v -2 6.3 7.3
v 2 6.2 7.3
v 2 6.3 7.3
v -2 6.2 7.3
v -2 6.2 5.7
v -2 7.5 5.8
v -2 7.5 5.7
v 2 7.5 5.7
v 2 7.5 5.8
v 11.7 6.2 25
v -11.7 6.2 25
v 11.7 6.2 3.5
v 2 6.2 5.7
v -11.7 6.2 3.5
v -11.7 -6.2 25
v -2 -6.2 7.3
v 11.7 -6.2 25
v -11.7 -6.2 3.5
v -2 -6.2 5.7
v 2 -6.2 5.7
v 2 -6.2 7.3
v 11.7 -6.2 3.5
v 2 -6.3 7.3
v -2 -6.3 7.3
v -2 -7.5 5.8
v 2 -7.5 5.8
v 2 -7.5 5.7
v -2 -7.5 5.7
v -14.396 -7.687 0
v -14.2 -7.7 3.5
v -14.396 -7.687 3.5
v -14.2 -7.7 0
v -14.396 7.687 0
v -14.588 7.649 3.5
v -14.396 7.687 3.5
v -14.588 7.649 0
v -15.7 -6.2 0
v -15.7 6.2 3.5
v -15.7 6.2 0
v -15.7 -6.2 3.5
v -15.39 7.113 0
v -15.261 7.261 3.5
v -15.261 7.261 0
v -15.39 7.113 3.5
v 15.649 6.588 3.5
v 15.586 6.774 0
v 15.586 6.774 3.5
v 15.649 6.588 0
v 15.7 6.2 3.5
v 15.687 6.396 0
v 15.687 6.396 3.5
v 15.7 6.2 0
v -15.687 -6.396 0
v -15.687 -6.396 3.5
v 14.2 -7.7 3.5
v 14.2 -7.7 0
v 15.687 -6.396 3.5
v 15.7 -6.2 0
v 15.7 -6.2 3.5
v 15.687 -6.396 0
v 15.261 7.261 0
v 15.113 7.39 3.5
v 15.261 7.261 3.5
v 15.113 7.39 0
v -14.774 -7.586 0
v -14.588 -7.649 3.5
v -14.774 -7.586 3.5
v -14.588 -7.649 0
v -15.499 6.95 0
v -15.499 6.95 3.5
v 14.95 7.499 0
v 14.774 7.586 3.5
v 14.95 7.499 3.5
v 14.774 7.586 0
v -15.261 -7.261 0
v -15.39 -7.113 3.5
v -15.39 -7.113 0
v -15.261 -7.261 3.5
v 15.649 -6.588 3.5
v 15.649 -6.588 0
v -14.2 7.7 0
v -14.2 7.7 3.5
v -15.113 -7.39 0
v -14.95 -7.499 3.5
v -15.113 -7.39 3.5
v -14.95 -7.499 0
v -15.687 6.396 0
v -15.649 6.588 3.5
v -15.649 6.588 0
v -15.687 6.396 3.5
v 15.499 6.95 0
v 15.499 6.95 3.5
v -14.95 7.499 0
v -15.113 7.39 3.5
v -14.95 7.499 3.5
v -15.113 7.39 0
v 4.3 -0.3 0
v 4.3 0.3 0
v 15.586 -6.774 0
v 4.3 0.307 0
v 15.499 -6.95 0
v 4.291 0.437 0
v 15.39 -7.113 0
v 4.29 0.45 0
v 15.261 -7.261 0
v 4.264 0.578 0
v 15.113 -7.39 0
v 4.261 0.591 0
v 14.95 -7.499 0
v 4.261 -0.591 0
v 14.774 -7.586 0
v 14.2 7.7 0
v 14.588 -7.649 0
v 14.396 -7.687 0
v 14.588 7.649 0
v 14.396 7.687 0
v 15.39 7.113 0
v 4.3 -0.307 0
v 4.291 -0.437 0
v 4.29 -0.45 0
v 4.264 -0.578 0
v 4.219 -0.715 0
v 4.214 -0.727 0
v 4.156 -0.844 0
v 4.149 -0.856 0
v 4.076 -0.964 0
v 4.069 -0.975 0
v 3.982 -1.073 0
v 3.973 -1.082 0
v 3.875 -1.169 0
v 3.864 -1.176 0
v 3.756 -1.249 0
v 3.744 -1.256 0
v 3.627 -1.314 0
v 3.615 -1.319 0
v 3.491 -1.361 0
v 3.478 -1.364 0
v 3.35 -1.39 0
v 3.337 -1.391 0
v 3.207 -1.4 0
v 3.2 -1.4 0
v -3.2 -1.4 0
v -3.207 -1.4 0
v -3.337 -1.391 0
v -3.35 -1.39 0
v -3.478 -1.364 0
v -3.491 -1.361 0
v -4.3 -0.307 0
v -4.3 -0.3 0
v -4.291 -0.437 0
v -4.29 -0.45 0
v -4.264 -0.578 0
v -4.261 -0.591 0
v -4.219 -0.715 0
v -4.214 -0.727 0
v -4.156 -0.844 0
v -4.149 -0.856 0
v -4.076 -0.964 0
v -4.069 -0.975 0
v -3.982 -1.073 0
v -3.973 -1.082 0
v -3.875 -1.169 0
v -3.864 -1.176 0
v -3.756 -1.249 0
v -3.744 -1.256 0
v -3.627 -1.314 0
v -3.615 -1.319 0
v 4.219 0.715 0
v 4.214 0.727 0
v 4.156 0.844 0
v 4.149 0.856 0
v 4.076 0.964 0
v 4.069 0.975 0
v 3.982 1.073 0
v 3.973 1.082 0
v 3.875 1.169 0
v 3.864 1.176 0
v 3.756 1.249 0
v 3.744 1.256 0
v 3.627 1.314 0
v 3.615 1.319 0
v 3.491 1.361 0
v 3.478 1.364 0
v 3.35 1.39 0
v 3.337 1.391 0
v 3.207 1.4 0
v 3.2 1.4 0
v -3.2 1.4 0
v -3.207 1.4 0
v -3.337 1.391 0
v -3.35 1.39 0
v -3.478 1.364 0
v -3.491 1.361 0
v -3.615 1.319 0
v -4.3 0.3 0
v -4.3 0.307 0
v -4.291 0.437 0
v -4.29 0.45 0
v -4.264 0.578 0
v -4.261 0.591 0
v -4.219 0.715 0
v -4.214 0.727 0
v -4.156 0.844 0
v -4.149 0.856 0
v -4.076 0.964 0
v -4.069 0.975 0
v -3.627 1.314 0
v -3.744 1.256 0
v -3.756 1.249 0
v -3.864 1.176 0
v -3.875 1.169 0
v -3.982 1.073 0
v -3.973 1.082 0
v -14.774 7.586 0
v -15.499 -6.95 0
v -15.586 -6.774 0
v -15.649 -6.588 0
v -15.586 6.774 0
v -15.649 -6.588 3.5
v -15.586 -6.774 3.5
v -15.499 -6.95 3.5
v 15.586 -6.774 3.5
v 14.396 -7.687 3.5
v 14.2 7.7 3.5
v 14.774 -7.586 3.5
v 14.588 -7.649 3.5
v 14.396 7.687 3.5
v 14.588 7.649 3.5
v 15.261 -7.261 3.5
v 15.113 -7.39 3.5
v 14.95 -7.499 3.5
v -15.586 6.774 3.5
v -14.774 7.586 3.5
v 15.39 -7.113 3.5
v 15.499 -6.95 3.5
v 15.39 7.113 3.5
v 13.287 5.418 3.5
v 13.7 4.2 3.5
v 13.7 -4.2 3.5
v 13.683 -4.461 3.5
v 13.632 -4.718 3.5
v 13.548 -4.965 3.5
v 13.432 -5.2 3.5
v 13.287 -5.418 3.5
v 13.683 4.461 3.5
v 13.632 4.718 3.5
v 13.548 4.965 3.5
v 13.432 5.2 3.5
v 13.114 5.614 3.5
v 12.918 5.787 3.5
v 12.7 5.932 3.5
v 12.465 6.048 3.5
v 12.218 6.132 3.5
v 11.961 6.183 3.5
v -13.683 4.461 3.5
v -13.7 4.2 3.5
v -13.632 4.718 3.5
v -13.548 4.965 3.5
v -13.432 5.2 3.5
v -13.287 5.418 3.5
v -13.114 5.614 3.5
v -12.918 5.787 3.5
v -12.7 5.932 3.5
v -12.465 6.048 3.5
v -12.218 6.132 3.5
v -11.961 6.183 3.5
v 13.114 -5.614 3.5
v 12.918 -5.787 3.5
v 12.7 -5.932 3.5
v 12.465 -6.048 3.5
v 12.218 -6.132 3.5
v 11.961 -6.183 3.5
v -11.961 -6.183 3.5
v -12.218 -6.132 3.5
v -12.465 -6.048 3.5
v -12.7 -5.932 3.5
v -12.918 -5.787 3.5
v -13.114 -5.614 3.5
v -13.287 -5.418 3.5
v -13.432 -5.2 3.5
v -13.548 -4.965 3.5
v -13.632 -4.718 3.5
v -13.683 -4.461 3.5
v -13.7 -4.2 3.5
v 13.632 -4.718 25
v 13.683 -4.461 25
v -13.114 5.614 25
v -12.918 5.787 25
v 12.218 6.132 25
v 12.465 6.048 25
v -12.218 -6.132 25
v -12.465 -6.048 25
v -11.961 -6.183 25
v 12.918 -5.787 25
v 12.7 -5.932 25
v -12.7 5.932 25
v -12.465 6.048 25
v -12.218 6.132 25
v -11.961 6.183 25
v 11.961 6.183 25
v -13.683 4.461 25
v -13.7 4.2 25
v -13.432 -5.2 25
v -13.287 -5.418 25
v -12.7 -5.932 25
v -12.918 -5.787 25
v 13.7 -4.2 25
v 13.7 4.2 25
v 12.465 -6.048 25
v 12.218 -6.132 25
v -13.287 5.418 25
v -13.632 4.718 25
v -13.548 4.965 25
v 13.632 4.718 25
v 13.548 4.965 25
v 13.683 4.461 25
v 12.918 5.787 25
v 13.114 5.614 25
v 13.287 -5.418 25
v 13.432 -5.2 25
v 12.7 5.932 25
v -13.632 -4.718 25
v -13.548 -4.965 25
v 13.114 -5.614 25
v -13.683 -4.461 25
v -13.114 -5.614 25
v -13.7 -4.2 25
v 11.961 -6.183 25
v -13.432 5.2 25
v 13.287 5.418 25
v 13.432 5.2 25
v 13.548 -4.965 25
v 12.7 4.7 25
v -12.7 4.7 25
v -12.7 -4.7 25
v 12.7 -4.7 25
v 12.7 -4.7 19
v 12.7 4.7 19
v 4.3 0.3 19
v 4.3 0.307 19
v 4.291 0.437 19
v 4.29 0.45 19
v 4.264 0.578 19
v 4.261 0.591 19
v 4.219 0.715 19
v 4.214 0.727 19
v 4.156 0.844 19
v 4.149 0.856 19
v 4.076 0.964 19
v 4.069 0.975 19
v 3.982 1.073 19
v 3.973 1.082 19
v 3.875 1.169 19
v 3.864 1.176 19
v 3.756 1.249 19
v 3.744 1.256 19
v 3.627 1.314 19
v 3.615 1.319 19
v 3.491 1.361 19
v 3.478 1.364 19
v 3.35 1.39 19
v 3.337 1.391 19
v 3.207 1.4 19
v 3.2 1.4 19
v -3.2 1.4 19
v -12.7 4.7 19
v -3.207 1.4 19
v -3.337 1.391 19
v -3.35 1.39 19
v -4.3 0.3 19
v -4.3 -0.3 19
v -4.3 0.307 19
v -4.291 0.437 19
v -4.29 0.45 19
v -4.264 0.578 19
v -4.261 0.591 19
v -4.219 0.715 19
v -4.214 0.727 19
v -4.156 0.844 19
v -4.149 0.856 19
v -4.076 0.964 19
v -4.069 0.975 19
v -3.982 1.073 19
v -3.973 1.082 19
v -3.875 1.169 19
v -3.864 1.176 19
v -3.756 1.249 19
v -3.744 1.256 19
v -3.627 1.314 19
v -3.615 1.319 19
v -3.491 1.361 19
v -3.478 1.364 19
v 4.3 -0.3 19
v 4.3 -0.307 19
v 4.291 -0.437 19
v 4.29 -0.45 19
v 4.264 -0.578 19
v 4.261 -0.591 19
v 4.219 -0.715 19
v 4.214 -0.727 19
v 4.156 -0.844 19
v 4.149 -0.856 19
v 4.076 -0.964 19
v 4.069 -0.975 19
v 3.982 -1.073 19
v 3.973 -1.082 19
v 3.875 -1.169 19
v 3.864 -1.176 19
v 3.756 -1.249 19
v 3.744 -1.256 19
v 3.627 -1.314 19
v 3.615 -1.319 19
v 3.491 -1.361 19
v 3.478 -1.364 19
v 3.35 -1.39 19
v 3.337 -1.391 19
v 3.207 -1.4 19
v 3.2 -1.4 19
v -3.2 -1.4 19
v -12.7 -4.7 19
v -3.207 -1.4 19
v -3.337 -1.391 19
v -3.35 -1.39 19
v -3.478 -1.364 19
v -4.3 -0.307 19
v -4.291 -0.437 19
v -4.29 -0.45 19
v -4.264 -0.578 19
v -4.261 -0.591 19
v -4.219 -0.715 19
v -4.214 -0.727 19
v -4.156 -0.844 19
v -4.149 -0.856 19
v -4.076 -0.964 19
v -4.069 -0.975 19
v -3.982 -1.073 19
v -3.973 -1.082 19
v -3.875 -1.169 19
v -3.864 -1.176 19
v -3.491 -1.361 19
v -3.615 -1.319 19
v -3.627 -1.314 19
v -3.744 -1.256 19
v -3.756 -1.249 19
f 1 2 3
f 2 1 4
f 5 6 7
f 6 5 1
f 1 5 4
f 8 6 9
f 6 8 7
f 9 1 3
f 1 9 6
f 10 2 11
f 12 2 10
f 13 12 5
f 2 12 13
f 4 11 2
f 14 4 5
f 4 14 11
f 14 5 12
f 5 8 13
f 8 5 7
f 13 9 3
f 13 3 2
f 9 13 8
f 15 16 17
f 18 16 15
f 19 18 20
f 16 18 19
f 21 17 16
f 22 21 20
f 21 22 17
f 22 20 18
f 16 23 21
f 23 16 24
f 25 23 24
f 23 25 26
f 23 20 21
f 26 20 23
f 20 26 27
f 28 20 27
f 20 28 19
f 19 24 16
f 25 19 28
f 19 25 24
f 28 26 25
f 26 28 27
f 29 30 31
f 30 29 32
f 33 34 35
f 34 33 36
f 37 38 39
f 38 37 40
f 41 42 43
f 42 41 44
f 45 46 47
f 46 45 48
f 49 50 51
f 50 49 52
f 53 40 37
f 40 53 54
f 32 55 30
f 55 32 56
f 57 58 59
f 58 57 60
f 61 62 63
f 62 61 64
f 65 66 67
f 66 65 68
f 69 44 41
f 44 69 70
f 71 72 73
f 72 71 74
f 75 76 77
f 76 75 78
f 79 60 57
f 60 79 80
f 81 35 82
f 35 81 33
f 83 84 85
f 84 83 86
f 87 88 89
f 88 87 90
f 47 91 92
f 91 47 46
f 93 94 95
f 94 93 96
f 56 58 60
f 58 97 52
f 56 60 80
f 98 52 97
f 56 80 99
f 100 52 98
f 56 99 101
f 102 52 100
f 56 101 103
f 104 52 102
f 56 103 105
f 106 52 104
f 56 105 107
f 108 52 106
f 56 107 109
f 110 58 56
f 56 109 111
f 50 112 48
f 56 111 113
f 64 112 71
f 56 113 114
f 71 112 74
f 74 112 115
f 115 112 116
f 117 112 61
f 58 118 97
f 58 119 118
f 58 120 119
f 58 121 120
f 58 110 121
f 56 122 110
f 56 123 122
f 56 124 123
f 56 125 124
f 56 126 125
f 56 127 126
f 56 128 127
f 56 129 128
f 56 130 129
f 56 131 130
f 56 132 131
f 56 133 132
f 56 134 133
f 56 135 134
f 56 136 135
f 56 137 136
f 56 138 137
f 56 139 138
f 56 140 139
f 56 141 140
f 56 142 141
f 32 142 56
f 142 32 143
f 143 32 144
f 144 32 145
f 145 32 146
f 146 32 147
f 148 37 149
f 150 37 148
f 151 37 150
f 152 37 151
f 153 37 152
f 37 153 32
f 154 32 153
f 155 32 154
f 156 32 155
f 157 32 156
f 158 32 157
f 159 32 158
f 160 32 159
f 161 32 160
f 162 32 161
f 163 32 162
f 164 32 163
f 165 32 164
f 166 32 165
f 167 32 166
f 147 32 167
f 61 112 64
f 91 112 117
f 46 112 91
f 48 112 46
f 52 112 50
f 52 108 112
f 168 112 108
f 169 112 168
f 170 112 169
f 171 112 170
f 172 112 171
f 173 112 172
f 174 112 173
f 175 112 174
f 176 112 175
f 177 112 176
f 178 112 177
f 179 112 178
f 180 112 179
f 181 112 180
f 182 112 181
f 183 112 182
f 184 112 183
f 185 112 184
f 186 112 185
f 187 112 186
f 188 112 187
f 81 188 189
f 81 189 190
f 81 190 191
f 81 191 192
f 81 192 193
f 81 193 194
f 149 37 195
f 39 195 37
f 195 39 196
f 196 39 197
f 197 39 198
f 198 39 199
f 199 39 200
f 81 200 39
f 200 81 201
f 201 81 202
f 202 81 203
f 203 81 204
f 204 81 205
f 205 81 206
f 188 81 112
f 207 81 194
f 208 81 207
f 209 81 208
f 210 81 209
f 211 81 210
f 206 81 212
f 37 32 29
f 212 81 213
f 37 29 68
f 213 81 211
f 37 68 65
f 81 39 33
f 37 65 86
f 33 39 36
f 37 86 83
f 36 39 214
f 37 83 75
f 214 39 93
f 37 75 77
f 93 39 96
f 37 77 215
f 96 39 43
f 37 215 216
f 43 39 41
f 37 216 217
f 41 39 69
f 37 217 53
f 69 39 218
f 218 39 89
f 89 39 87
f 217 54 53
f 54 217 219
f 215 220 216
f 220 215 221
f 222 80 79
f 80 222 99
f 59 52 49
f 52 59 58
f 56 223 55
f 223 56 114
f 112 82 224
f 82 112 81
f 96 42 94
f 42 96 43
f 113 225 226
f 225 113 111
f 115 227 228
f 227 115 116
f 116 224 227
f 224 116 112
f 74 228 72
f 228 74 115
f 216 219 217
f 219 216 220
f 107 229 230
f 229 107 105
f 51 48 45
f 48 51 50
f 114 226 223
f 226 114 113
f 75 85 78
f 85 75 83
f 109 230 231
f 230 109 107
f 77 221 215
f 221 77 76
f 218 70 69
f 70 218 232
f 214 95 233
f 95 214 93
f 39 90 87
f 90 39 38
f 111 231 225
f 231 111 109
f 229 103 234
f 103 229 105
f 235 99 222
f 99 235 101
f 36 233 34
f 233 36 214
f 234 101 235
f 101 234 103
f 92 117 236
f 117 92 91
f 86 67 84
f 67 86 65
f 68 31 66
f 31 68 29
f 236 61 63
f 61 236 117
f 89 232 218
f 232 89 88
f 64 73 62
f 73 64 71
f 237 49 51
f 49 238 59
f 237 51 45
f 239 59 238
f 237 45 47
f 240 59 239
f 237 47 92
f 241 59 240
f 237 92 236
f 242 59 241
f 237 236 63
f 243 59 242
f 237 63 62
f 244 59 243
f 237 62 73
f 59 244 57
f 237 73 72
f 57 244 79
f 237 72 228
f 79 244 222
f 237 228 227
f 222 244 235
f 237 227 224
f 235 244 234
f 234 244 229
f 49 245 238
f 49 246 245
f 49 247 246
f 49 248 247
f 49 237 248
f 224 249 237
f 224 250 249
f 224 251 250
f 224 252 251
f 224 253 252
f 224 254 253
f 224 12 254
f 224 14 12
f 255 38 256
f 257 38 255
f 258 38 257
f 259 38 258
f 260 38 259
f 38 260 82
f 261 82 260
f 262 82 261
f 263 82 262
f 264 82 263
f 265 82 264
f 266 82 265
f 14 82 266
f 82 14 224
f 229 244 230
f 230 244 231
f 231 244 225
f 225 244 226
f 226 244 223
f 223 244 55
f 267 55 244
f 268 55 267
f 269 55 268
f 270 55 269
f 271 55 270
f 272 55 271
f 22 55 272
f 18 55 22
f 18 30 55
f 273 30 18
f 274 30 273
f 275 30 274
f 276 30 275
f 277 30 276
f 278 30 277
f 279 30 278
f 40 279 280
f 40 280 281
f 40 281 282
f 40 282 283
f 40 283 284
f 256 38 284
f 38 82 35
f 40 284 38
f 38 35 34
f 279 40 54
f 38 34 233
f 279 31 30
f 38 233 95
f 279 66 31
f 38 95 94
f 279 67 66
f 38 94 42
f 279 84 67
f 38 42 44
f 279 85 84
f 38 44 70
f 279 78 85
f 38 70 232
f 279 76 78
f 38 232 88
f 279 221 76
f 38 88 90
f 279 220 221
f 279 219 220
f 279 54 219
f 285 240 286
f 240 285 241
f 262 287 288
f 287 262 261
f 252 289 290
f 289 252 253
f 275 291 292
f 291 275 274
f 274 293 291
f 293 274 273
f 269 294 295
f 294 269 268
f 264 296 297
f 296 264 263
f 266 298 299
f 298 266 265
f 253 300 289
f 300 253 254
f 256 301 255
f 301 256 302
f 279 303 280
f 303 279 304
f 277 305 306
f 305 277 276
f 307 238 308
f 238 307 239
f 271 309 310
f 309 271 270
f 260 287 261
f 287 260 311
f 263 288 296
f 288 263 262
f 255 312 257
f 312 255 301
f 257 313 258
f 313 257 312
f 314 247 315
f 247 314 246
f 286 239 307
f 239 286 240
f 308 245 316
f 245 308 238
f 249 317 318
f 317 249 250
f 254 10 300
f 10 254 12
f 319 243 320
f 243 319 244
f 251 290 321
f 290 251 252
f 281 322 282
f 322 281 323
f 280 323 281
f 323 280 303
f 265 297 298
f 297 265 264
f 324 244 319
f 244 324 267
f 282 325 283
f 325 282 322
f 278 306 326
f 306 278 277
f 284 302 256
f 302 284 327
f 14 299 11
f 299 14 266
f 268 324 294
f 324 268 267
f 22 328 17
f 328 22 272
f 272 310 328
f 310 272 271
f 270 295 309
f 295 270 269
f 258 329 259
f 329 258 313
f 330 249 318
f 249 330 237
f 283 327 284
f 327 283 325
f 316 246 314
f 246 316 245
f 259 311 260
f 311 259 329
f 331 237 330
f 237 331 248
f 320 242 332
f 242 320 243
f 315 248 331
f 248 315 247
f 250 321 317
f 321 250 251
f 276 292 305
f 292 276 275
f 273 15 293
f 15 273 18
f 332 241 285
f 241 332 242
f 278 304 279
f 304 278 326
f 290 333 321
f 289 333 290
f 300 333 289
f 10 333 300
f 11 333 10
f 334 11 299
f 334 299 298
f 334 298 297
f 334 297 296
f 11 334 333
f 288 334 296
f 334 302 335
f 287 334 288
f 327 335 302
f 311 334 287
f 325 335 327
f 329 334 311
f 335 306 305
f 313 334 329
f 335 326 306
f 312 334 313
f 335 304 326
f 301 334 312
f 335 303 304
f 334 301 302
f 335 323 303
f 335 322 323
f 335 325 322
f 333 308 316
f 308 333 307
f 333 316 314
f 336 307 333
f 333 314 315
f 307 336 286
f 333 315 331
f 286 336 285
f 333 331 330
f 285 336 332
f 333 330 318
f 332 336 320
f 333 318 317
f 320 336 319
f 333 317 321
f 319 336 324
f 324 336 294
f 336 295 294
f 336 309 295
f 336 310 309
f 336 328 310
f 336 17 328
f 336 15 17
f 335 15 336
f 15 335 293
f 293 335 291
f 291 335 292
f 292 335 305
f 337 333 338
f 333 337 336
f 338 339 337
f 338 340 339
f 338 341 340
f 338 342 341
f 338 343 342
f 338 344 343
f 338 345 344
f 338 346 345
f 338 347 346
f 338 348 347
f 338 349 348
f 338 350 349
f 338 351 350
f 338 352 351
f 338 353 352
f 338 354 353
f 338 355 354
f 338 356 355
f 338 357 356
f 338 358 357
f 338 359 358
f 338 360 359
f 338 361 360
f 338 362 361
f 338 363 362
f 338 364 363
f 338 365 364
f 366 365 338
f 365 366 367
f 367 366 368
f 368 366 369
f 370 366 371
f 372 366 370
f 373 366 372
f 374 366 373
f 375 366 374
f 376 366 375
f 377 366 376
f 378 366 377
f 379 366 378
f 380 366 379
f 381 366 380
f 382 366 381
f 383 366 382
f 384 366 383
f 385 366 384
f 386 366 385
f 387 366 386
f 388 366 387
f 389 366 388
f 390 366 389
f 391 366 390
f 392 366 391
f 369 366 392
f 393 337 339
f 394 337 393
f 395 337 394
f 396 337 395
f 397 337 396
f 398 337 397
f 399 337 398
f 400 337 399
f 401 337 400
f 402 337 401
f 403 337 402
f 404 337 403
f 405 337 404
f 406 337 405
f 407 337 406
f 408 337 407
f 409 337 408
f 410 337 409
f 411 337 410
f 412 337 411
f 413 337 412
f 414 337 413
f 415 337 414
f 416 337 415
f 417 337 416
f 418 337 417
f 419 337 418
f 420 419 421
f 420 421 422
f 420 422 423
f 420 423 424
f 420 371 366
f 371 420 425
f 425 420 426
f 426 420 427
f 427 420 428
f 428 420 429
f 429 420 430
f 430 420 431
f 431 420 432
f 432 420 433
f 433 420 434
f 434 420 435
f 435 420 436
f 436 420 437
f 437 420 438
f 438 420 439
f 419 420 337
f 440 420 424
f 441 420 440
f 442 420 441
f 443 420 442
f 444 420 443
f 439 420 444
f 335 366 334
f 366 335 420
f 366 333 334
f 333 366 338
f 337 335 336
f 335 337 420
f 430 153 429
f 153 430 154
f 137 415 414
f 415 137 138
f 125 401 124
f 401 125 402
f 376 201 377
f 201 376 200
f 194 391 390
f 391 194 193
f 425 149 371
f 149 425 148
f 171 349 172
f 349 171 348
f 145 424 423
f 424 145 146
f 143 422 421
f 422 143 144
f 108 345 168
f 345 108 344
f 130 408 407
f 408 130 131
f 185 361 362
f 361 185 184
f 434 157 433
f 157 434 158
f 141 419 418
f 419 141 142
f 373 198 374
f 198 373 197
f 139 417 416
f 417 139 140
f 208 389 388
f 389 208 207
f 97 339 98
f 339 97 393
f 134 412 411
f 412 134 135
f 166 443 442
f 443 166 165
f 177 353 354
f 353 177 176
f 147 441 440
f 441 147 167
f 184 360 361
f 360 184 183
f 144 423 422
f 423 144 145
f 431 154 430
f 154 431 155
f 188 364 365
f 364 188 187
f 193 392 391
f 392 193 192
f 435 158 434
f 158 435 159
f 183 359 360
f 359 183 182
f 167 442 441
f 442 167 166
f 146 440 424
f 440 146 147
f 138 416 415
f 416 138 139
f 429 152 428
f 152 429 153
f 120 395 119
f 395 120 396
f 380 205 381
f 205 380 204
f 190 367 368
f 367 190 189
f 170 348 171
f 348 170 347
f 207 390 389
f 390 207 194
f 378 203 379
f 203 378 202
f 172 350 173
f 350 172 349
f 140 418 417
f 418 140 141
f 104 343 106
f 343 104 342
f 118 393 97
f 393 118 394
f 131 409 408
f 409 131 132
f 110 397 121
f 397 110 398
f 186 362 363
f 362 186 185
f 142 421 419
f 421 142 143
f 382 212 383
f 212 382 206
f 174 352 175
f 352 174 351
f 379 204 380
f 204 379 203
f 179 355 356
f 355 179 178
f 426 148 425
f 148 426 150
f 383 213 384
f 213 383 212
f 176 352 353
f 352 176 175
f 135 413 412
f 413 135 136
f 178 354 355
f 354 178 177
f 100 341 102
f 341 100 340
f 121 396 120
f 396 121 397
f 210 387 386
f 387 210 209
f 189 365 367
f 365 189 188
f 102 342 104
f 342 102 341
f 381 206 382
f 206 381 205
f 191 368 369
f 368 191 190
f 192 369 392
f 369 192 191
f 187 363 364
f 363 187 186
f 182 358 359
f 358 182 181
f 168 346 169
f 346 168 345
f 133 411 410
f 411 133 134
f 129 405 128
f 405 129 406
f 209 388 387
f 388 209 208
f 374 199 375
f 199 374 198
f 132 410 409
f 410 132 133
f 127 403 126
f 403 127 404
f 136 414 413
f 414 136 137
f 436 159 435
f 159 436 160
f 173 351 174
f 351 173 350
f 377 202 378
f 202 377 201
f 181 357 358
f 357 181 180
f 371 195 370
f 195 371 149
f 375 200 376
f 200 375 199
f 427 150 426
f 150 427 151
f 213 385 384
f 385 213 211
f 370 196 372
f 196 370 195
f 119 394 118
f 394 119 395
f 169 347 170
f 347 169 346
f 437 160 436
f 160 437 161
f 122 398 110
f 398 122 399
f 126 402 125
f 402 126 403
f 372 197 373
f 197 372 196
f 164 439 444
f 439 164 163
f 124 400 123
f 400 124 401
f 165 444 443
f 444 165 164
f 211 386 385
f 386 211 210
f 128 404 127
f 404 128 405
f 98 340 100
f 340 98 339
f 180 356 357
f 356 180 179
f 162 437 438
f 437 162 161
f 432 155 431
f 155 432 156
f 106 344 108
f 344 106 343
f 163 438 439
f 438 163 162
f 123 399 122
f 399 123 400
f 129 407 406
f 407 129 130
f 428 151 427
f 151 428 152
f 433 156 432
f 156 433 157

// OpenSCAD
// file: parameters.scad
// ============================================
// MODULAR CABLE ORGANIZER - SHARED PARAMETERS
// ============================================
// All dimensions in mm - include this in all files
// ============================================

$fn = 48;

// === TOLERANCES ===
clearance = 0.3;
port_clearance = 0.1;  // Extra clearance for port openings (reduced - 0.2 was too loose for USB-C)
wall = 1.6;

// === SLOT DIMENSIONS (2:1 aspect ratio) - scaled to 2/3 ===
slot_width = 32;  // Standard wide slot for larger connectors
slot_width_narrow = 16;  // Narrow slot for compact connectors (USB-C, micro-USB, USB-A, Lightning, 3.5mm)
slot_height = 16;  // Height is same for both wide and narrow
slot_depth = 4;  // Reduced from 6mm - less frame depth needed

// === FRAME STRUCTURE ===
frame_wall = 2.0;   // Wall between slots - 6 layers @ 0.4mm nozzle for strength
frame_border = 6;  // Increased by 10mm for mounting holes with countersink
frame_back = 2;     // Slightly thicker for snap catch strength
mount_hole_dia = 4;  // M4 mounting holes (changed from M3 for common screw sizes)
countersink_dia = 8;  // Diameter of countersink for M4 screw heads
countersink_depth = 2;  // Depth of countersink

// === DEFAULT GRID (can be overridden in individual files) ===
grid_cols = 2;
grid_rows = 2;

// === INSERT BASE DIMENSIONS ===
insert_width = slot_width - (2 * clearance);
insert_height = slot_height - (2 * clearance);
insert_base_depth = slot_depth - 0.5;

// === NARROW INSERT BASE DIMENSIONS ===
insert_width_narrow = slot_width_narrow - (2 * clearance);
insert_height_narrow = slot_height - (2 * clearance);

// === INSERT BODY (protrudes from frame) ===
insert_body_width = insert_width - 4;
insert_body_height = insert_height - 3;
insert_body_depth = 15.5;  // Standardized depth (USB-B 15.26mm + 0.25mm buffer) - all inserts same height
insert_top_thick = 1.5;  // Top platform thickness

// === NARROW INSERT BODY (protrudes from frame) ===
insert_body_width_narrow = insert_width_narrow - 4;
insert_body_height_narrow = insert_height_narrow - 3;

// === SNAP TABS (on neck/body - catch on back plate) ===
snap_tab_width = 4;
snap_tab_protrude = 1.2;  // How far tab sticks out from body
snap_tab_thick = 1.5;     // Z thickness of tab
snap_tab_offset = 2.2;      // Distance from base to tab bottom on insert (increased to clear frame)

// === CONNECTOR PORT DIMENSIONS & BODY DEPTHS ===
// Port dimensions from reference blueprints
// Body depths sized to match typical male connector lengths

// USB-C: 8.4 x 2.6mm, male connector ~9mm
usbc_w = 8.4;
usbc_h = 2.6;
usbc_r = 1.0;
usbc_body_depth = 15.5;  // Standardized depth (USB-B 15.26mm + 0.25mm buffer)
// NO RETENTION RIBS for USB-C (removed per user request)

// USB-A: 13.0 x 4.5mm (standard male USB-A height)
usba_w = 13.0;
usba_h = 4.5;  // Match actual male USB-A height
usba_r = 0.5;
usba_body_depth = 15.5;  // Standardized depth (USB-B 15.26mm + 0.25mm buffer)
usba_retention_rib_depth = 5.0;  // Distance from front (moved back 1mm so ribs don't break)
usba_retention_rib_size = 0.15;  // How far ribs protrude inward

// USB Mini: 6.9 x 3.0mm, male connector ~9mm
usb_mini_w = 6.9;
usb_mini_h = 3.0;
usb_mini_r = 0.5;
usb_mini_body_depth = 15.5;  // Standardized depth (USB-B 15.26mm + 0.25mm buffer)
usb_mini_retention_rib_depth = 3.5;  // Distance from front where retention ribs start
usb_mini_retention_rib_size = 0.125;  // Reduced to half (was 0.25)

// USB Micro-B: 7.4 x 1.8mm (wider to fit corners of trapezoid)
usb_micro_w = 7.4;  // Increased width for corners
usb_micro_h = 1.8;
usb_micro_r = 0.3;
usb_micro_body_depth = 15.5;  // Standardized depth (USB-B 15.26mm + 0.25mm buffer)
usb_micro_retention_rib_depth = 4.5;  // Distance from front (moved back 1mm so ribs don't break)
usb_micro_retention_rib_size = 0.125;  // How far ribs protrude inward

// USB-B: 8.75 x 7.78mm (standard male USB-B height)
usb_b_w = 8.75;  // Width at bottom (wider)
usb_b_h = 7.78;  // Match actual male USB-B height (reduced from 7.9)
usb_b_r = 0.6;   // Corner radius
usb_b_top_inset = 0.9;  // How much narrower the top is (creates trapezoid shape)
usb_b_body_depth = 15.5;  // Standardized depth (15.26mm connector + 0.25mm buffer)
usb_b_retention_rib_depth = 5.5;  // Distance from front (moved back 1mm so ribs don't break)
usb_b_retention_rib_size = 0.15;  // How far ribs protrude inward

// Lightning: 7.6 x 1.5mm, male connector ~8mm (measured from actual connector)
lightning_w = 7.6;
lightning_h = 1.5;
lightning_r = 0.5;
lightning_body_depth = 15.5;  // Standardized depth (USB-B 15.26mm + 0.25mm buffer)
lightning_retention_rib_depth = 4.0;  // Distance from front (moved back 1mm so ribs don't break)
lightning_retention_rib_size = 0.1;   // How far ribs protrude inward

// HDMI: 14.65 x 4.45mm (standard male HDMI height)
hdmi_w = 14.65;
hdmi_h = 4.45;  // Match actual male HDMI height
hdmi_r = 0.5;
hdmi_body_depth = 15.5;  // Standardized depth (USB-B 15.26mm + 0.25mm buffer)
hdmi_retention_rib_depth = 6.0;  // Distance from front (moved back 1mm so ribs don't break)
hdmi_retention_rib_size = 0.1;   // How far ribs protrude inward

// 3.5mm Audio Jack: standard 3.5mm (1/8") diameter
audio_jack_dia = 3.6;  // 3.5mm + 0.1mm for less snug fit
audio_jack_body_depth = 15.5;  // Standardized depth (USB-B 15.26mm + 0.25mm buffer)
// Ring positions for TRS/TRRS ribs (tip, ring1, ring2 from front)
audio_jack_ring1 = 3.5;  // First ring position from front
audio_jack_ring2 = 6.5;  // Second ring position from front

// Blank/Label: recessed area for label
label_w = 30;
label_h = 12;
label_depth = 0.8;

// Keyhole mounting slot: picture-hanger style for wall/table mounting
// The keyhole allows a round-headed screw to pass through, then lock in slot
keyhole_head_dia = 6;   // Diameter for screw head to pass through (5% narrower, fits #6-#8 wood screws)
keyhole_slot_width = 3.5; // Width of slot for screw shaft
keyhole_slot_length = 5.3; // Travel distance to lock screw in place
keyhole_depth = 2.5;      // Depth of keyhole cut (allows screw head to sit below surface)

// AC Power Plug: asymmetric holes for polarity (US 2-prong)
// Prongs are VERTICAL (tall and thin)
// Hot prong (narrower): 1.6mm wide x 6.5mm tall
// Neutral prong (wider): 1.6mm wide x 8.5mm tall (increased)
power_hot_w = 1.6;   // Width (thin dimension)
power_hot_h = 6.5;   // Height (tall dimension)
power_neutral_w = 1.6;   // Width (thin dimension)
power_neutral_h = 8.5;   // Height (tall dimension, increased from 8.1)
power_prong_spacing = 12.7;  // 0.5" center-to-center
power_body_depth = 15.5;  // Standardized depth (USB-B 15.26mm + 0.25mm buffer)

// === CALCULATED VALUES ===
frame_total_depth = frame_back + slot_depth;
grid_width = (grid_cols * slot_width) + ((grid_cols - 1) * frame_wall);
grid_height = (grid_rows * slot_height) + ((grid_rows - 1) * frame_wall);
frame_width = grid_width + (2 * frame_border);
frame_height_total = grid_height + (2 * frame_border);
insert_total_depth = insert_base_depth + insert_body_depth;
// main file
// ============================================
// PRINT FILE: Universal DisplayPort Adapter Insert
// ============================================
// Accepts DisplayPort male connector on front
// Routes to 24-pin universal interface on rear
// Native routing - no active conversion needed
// ============================================

include <insert_universal_base.scad>

// Render the universal DisplayPort adapter
insert_universal_displayport();
